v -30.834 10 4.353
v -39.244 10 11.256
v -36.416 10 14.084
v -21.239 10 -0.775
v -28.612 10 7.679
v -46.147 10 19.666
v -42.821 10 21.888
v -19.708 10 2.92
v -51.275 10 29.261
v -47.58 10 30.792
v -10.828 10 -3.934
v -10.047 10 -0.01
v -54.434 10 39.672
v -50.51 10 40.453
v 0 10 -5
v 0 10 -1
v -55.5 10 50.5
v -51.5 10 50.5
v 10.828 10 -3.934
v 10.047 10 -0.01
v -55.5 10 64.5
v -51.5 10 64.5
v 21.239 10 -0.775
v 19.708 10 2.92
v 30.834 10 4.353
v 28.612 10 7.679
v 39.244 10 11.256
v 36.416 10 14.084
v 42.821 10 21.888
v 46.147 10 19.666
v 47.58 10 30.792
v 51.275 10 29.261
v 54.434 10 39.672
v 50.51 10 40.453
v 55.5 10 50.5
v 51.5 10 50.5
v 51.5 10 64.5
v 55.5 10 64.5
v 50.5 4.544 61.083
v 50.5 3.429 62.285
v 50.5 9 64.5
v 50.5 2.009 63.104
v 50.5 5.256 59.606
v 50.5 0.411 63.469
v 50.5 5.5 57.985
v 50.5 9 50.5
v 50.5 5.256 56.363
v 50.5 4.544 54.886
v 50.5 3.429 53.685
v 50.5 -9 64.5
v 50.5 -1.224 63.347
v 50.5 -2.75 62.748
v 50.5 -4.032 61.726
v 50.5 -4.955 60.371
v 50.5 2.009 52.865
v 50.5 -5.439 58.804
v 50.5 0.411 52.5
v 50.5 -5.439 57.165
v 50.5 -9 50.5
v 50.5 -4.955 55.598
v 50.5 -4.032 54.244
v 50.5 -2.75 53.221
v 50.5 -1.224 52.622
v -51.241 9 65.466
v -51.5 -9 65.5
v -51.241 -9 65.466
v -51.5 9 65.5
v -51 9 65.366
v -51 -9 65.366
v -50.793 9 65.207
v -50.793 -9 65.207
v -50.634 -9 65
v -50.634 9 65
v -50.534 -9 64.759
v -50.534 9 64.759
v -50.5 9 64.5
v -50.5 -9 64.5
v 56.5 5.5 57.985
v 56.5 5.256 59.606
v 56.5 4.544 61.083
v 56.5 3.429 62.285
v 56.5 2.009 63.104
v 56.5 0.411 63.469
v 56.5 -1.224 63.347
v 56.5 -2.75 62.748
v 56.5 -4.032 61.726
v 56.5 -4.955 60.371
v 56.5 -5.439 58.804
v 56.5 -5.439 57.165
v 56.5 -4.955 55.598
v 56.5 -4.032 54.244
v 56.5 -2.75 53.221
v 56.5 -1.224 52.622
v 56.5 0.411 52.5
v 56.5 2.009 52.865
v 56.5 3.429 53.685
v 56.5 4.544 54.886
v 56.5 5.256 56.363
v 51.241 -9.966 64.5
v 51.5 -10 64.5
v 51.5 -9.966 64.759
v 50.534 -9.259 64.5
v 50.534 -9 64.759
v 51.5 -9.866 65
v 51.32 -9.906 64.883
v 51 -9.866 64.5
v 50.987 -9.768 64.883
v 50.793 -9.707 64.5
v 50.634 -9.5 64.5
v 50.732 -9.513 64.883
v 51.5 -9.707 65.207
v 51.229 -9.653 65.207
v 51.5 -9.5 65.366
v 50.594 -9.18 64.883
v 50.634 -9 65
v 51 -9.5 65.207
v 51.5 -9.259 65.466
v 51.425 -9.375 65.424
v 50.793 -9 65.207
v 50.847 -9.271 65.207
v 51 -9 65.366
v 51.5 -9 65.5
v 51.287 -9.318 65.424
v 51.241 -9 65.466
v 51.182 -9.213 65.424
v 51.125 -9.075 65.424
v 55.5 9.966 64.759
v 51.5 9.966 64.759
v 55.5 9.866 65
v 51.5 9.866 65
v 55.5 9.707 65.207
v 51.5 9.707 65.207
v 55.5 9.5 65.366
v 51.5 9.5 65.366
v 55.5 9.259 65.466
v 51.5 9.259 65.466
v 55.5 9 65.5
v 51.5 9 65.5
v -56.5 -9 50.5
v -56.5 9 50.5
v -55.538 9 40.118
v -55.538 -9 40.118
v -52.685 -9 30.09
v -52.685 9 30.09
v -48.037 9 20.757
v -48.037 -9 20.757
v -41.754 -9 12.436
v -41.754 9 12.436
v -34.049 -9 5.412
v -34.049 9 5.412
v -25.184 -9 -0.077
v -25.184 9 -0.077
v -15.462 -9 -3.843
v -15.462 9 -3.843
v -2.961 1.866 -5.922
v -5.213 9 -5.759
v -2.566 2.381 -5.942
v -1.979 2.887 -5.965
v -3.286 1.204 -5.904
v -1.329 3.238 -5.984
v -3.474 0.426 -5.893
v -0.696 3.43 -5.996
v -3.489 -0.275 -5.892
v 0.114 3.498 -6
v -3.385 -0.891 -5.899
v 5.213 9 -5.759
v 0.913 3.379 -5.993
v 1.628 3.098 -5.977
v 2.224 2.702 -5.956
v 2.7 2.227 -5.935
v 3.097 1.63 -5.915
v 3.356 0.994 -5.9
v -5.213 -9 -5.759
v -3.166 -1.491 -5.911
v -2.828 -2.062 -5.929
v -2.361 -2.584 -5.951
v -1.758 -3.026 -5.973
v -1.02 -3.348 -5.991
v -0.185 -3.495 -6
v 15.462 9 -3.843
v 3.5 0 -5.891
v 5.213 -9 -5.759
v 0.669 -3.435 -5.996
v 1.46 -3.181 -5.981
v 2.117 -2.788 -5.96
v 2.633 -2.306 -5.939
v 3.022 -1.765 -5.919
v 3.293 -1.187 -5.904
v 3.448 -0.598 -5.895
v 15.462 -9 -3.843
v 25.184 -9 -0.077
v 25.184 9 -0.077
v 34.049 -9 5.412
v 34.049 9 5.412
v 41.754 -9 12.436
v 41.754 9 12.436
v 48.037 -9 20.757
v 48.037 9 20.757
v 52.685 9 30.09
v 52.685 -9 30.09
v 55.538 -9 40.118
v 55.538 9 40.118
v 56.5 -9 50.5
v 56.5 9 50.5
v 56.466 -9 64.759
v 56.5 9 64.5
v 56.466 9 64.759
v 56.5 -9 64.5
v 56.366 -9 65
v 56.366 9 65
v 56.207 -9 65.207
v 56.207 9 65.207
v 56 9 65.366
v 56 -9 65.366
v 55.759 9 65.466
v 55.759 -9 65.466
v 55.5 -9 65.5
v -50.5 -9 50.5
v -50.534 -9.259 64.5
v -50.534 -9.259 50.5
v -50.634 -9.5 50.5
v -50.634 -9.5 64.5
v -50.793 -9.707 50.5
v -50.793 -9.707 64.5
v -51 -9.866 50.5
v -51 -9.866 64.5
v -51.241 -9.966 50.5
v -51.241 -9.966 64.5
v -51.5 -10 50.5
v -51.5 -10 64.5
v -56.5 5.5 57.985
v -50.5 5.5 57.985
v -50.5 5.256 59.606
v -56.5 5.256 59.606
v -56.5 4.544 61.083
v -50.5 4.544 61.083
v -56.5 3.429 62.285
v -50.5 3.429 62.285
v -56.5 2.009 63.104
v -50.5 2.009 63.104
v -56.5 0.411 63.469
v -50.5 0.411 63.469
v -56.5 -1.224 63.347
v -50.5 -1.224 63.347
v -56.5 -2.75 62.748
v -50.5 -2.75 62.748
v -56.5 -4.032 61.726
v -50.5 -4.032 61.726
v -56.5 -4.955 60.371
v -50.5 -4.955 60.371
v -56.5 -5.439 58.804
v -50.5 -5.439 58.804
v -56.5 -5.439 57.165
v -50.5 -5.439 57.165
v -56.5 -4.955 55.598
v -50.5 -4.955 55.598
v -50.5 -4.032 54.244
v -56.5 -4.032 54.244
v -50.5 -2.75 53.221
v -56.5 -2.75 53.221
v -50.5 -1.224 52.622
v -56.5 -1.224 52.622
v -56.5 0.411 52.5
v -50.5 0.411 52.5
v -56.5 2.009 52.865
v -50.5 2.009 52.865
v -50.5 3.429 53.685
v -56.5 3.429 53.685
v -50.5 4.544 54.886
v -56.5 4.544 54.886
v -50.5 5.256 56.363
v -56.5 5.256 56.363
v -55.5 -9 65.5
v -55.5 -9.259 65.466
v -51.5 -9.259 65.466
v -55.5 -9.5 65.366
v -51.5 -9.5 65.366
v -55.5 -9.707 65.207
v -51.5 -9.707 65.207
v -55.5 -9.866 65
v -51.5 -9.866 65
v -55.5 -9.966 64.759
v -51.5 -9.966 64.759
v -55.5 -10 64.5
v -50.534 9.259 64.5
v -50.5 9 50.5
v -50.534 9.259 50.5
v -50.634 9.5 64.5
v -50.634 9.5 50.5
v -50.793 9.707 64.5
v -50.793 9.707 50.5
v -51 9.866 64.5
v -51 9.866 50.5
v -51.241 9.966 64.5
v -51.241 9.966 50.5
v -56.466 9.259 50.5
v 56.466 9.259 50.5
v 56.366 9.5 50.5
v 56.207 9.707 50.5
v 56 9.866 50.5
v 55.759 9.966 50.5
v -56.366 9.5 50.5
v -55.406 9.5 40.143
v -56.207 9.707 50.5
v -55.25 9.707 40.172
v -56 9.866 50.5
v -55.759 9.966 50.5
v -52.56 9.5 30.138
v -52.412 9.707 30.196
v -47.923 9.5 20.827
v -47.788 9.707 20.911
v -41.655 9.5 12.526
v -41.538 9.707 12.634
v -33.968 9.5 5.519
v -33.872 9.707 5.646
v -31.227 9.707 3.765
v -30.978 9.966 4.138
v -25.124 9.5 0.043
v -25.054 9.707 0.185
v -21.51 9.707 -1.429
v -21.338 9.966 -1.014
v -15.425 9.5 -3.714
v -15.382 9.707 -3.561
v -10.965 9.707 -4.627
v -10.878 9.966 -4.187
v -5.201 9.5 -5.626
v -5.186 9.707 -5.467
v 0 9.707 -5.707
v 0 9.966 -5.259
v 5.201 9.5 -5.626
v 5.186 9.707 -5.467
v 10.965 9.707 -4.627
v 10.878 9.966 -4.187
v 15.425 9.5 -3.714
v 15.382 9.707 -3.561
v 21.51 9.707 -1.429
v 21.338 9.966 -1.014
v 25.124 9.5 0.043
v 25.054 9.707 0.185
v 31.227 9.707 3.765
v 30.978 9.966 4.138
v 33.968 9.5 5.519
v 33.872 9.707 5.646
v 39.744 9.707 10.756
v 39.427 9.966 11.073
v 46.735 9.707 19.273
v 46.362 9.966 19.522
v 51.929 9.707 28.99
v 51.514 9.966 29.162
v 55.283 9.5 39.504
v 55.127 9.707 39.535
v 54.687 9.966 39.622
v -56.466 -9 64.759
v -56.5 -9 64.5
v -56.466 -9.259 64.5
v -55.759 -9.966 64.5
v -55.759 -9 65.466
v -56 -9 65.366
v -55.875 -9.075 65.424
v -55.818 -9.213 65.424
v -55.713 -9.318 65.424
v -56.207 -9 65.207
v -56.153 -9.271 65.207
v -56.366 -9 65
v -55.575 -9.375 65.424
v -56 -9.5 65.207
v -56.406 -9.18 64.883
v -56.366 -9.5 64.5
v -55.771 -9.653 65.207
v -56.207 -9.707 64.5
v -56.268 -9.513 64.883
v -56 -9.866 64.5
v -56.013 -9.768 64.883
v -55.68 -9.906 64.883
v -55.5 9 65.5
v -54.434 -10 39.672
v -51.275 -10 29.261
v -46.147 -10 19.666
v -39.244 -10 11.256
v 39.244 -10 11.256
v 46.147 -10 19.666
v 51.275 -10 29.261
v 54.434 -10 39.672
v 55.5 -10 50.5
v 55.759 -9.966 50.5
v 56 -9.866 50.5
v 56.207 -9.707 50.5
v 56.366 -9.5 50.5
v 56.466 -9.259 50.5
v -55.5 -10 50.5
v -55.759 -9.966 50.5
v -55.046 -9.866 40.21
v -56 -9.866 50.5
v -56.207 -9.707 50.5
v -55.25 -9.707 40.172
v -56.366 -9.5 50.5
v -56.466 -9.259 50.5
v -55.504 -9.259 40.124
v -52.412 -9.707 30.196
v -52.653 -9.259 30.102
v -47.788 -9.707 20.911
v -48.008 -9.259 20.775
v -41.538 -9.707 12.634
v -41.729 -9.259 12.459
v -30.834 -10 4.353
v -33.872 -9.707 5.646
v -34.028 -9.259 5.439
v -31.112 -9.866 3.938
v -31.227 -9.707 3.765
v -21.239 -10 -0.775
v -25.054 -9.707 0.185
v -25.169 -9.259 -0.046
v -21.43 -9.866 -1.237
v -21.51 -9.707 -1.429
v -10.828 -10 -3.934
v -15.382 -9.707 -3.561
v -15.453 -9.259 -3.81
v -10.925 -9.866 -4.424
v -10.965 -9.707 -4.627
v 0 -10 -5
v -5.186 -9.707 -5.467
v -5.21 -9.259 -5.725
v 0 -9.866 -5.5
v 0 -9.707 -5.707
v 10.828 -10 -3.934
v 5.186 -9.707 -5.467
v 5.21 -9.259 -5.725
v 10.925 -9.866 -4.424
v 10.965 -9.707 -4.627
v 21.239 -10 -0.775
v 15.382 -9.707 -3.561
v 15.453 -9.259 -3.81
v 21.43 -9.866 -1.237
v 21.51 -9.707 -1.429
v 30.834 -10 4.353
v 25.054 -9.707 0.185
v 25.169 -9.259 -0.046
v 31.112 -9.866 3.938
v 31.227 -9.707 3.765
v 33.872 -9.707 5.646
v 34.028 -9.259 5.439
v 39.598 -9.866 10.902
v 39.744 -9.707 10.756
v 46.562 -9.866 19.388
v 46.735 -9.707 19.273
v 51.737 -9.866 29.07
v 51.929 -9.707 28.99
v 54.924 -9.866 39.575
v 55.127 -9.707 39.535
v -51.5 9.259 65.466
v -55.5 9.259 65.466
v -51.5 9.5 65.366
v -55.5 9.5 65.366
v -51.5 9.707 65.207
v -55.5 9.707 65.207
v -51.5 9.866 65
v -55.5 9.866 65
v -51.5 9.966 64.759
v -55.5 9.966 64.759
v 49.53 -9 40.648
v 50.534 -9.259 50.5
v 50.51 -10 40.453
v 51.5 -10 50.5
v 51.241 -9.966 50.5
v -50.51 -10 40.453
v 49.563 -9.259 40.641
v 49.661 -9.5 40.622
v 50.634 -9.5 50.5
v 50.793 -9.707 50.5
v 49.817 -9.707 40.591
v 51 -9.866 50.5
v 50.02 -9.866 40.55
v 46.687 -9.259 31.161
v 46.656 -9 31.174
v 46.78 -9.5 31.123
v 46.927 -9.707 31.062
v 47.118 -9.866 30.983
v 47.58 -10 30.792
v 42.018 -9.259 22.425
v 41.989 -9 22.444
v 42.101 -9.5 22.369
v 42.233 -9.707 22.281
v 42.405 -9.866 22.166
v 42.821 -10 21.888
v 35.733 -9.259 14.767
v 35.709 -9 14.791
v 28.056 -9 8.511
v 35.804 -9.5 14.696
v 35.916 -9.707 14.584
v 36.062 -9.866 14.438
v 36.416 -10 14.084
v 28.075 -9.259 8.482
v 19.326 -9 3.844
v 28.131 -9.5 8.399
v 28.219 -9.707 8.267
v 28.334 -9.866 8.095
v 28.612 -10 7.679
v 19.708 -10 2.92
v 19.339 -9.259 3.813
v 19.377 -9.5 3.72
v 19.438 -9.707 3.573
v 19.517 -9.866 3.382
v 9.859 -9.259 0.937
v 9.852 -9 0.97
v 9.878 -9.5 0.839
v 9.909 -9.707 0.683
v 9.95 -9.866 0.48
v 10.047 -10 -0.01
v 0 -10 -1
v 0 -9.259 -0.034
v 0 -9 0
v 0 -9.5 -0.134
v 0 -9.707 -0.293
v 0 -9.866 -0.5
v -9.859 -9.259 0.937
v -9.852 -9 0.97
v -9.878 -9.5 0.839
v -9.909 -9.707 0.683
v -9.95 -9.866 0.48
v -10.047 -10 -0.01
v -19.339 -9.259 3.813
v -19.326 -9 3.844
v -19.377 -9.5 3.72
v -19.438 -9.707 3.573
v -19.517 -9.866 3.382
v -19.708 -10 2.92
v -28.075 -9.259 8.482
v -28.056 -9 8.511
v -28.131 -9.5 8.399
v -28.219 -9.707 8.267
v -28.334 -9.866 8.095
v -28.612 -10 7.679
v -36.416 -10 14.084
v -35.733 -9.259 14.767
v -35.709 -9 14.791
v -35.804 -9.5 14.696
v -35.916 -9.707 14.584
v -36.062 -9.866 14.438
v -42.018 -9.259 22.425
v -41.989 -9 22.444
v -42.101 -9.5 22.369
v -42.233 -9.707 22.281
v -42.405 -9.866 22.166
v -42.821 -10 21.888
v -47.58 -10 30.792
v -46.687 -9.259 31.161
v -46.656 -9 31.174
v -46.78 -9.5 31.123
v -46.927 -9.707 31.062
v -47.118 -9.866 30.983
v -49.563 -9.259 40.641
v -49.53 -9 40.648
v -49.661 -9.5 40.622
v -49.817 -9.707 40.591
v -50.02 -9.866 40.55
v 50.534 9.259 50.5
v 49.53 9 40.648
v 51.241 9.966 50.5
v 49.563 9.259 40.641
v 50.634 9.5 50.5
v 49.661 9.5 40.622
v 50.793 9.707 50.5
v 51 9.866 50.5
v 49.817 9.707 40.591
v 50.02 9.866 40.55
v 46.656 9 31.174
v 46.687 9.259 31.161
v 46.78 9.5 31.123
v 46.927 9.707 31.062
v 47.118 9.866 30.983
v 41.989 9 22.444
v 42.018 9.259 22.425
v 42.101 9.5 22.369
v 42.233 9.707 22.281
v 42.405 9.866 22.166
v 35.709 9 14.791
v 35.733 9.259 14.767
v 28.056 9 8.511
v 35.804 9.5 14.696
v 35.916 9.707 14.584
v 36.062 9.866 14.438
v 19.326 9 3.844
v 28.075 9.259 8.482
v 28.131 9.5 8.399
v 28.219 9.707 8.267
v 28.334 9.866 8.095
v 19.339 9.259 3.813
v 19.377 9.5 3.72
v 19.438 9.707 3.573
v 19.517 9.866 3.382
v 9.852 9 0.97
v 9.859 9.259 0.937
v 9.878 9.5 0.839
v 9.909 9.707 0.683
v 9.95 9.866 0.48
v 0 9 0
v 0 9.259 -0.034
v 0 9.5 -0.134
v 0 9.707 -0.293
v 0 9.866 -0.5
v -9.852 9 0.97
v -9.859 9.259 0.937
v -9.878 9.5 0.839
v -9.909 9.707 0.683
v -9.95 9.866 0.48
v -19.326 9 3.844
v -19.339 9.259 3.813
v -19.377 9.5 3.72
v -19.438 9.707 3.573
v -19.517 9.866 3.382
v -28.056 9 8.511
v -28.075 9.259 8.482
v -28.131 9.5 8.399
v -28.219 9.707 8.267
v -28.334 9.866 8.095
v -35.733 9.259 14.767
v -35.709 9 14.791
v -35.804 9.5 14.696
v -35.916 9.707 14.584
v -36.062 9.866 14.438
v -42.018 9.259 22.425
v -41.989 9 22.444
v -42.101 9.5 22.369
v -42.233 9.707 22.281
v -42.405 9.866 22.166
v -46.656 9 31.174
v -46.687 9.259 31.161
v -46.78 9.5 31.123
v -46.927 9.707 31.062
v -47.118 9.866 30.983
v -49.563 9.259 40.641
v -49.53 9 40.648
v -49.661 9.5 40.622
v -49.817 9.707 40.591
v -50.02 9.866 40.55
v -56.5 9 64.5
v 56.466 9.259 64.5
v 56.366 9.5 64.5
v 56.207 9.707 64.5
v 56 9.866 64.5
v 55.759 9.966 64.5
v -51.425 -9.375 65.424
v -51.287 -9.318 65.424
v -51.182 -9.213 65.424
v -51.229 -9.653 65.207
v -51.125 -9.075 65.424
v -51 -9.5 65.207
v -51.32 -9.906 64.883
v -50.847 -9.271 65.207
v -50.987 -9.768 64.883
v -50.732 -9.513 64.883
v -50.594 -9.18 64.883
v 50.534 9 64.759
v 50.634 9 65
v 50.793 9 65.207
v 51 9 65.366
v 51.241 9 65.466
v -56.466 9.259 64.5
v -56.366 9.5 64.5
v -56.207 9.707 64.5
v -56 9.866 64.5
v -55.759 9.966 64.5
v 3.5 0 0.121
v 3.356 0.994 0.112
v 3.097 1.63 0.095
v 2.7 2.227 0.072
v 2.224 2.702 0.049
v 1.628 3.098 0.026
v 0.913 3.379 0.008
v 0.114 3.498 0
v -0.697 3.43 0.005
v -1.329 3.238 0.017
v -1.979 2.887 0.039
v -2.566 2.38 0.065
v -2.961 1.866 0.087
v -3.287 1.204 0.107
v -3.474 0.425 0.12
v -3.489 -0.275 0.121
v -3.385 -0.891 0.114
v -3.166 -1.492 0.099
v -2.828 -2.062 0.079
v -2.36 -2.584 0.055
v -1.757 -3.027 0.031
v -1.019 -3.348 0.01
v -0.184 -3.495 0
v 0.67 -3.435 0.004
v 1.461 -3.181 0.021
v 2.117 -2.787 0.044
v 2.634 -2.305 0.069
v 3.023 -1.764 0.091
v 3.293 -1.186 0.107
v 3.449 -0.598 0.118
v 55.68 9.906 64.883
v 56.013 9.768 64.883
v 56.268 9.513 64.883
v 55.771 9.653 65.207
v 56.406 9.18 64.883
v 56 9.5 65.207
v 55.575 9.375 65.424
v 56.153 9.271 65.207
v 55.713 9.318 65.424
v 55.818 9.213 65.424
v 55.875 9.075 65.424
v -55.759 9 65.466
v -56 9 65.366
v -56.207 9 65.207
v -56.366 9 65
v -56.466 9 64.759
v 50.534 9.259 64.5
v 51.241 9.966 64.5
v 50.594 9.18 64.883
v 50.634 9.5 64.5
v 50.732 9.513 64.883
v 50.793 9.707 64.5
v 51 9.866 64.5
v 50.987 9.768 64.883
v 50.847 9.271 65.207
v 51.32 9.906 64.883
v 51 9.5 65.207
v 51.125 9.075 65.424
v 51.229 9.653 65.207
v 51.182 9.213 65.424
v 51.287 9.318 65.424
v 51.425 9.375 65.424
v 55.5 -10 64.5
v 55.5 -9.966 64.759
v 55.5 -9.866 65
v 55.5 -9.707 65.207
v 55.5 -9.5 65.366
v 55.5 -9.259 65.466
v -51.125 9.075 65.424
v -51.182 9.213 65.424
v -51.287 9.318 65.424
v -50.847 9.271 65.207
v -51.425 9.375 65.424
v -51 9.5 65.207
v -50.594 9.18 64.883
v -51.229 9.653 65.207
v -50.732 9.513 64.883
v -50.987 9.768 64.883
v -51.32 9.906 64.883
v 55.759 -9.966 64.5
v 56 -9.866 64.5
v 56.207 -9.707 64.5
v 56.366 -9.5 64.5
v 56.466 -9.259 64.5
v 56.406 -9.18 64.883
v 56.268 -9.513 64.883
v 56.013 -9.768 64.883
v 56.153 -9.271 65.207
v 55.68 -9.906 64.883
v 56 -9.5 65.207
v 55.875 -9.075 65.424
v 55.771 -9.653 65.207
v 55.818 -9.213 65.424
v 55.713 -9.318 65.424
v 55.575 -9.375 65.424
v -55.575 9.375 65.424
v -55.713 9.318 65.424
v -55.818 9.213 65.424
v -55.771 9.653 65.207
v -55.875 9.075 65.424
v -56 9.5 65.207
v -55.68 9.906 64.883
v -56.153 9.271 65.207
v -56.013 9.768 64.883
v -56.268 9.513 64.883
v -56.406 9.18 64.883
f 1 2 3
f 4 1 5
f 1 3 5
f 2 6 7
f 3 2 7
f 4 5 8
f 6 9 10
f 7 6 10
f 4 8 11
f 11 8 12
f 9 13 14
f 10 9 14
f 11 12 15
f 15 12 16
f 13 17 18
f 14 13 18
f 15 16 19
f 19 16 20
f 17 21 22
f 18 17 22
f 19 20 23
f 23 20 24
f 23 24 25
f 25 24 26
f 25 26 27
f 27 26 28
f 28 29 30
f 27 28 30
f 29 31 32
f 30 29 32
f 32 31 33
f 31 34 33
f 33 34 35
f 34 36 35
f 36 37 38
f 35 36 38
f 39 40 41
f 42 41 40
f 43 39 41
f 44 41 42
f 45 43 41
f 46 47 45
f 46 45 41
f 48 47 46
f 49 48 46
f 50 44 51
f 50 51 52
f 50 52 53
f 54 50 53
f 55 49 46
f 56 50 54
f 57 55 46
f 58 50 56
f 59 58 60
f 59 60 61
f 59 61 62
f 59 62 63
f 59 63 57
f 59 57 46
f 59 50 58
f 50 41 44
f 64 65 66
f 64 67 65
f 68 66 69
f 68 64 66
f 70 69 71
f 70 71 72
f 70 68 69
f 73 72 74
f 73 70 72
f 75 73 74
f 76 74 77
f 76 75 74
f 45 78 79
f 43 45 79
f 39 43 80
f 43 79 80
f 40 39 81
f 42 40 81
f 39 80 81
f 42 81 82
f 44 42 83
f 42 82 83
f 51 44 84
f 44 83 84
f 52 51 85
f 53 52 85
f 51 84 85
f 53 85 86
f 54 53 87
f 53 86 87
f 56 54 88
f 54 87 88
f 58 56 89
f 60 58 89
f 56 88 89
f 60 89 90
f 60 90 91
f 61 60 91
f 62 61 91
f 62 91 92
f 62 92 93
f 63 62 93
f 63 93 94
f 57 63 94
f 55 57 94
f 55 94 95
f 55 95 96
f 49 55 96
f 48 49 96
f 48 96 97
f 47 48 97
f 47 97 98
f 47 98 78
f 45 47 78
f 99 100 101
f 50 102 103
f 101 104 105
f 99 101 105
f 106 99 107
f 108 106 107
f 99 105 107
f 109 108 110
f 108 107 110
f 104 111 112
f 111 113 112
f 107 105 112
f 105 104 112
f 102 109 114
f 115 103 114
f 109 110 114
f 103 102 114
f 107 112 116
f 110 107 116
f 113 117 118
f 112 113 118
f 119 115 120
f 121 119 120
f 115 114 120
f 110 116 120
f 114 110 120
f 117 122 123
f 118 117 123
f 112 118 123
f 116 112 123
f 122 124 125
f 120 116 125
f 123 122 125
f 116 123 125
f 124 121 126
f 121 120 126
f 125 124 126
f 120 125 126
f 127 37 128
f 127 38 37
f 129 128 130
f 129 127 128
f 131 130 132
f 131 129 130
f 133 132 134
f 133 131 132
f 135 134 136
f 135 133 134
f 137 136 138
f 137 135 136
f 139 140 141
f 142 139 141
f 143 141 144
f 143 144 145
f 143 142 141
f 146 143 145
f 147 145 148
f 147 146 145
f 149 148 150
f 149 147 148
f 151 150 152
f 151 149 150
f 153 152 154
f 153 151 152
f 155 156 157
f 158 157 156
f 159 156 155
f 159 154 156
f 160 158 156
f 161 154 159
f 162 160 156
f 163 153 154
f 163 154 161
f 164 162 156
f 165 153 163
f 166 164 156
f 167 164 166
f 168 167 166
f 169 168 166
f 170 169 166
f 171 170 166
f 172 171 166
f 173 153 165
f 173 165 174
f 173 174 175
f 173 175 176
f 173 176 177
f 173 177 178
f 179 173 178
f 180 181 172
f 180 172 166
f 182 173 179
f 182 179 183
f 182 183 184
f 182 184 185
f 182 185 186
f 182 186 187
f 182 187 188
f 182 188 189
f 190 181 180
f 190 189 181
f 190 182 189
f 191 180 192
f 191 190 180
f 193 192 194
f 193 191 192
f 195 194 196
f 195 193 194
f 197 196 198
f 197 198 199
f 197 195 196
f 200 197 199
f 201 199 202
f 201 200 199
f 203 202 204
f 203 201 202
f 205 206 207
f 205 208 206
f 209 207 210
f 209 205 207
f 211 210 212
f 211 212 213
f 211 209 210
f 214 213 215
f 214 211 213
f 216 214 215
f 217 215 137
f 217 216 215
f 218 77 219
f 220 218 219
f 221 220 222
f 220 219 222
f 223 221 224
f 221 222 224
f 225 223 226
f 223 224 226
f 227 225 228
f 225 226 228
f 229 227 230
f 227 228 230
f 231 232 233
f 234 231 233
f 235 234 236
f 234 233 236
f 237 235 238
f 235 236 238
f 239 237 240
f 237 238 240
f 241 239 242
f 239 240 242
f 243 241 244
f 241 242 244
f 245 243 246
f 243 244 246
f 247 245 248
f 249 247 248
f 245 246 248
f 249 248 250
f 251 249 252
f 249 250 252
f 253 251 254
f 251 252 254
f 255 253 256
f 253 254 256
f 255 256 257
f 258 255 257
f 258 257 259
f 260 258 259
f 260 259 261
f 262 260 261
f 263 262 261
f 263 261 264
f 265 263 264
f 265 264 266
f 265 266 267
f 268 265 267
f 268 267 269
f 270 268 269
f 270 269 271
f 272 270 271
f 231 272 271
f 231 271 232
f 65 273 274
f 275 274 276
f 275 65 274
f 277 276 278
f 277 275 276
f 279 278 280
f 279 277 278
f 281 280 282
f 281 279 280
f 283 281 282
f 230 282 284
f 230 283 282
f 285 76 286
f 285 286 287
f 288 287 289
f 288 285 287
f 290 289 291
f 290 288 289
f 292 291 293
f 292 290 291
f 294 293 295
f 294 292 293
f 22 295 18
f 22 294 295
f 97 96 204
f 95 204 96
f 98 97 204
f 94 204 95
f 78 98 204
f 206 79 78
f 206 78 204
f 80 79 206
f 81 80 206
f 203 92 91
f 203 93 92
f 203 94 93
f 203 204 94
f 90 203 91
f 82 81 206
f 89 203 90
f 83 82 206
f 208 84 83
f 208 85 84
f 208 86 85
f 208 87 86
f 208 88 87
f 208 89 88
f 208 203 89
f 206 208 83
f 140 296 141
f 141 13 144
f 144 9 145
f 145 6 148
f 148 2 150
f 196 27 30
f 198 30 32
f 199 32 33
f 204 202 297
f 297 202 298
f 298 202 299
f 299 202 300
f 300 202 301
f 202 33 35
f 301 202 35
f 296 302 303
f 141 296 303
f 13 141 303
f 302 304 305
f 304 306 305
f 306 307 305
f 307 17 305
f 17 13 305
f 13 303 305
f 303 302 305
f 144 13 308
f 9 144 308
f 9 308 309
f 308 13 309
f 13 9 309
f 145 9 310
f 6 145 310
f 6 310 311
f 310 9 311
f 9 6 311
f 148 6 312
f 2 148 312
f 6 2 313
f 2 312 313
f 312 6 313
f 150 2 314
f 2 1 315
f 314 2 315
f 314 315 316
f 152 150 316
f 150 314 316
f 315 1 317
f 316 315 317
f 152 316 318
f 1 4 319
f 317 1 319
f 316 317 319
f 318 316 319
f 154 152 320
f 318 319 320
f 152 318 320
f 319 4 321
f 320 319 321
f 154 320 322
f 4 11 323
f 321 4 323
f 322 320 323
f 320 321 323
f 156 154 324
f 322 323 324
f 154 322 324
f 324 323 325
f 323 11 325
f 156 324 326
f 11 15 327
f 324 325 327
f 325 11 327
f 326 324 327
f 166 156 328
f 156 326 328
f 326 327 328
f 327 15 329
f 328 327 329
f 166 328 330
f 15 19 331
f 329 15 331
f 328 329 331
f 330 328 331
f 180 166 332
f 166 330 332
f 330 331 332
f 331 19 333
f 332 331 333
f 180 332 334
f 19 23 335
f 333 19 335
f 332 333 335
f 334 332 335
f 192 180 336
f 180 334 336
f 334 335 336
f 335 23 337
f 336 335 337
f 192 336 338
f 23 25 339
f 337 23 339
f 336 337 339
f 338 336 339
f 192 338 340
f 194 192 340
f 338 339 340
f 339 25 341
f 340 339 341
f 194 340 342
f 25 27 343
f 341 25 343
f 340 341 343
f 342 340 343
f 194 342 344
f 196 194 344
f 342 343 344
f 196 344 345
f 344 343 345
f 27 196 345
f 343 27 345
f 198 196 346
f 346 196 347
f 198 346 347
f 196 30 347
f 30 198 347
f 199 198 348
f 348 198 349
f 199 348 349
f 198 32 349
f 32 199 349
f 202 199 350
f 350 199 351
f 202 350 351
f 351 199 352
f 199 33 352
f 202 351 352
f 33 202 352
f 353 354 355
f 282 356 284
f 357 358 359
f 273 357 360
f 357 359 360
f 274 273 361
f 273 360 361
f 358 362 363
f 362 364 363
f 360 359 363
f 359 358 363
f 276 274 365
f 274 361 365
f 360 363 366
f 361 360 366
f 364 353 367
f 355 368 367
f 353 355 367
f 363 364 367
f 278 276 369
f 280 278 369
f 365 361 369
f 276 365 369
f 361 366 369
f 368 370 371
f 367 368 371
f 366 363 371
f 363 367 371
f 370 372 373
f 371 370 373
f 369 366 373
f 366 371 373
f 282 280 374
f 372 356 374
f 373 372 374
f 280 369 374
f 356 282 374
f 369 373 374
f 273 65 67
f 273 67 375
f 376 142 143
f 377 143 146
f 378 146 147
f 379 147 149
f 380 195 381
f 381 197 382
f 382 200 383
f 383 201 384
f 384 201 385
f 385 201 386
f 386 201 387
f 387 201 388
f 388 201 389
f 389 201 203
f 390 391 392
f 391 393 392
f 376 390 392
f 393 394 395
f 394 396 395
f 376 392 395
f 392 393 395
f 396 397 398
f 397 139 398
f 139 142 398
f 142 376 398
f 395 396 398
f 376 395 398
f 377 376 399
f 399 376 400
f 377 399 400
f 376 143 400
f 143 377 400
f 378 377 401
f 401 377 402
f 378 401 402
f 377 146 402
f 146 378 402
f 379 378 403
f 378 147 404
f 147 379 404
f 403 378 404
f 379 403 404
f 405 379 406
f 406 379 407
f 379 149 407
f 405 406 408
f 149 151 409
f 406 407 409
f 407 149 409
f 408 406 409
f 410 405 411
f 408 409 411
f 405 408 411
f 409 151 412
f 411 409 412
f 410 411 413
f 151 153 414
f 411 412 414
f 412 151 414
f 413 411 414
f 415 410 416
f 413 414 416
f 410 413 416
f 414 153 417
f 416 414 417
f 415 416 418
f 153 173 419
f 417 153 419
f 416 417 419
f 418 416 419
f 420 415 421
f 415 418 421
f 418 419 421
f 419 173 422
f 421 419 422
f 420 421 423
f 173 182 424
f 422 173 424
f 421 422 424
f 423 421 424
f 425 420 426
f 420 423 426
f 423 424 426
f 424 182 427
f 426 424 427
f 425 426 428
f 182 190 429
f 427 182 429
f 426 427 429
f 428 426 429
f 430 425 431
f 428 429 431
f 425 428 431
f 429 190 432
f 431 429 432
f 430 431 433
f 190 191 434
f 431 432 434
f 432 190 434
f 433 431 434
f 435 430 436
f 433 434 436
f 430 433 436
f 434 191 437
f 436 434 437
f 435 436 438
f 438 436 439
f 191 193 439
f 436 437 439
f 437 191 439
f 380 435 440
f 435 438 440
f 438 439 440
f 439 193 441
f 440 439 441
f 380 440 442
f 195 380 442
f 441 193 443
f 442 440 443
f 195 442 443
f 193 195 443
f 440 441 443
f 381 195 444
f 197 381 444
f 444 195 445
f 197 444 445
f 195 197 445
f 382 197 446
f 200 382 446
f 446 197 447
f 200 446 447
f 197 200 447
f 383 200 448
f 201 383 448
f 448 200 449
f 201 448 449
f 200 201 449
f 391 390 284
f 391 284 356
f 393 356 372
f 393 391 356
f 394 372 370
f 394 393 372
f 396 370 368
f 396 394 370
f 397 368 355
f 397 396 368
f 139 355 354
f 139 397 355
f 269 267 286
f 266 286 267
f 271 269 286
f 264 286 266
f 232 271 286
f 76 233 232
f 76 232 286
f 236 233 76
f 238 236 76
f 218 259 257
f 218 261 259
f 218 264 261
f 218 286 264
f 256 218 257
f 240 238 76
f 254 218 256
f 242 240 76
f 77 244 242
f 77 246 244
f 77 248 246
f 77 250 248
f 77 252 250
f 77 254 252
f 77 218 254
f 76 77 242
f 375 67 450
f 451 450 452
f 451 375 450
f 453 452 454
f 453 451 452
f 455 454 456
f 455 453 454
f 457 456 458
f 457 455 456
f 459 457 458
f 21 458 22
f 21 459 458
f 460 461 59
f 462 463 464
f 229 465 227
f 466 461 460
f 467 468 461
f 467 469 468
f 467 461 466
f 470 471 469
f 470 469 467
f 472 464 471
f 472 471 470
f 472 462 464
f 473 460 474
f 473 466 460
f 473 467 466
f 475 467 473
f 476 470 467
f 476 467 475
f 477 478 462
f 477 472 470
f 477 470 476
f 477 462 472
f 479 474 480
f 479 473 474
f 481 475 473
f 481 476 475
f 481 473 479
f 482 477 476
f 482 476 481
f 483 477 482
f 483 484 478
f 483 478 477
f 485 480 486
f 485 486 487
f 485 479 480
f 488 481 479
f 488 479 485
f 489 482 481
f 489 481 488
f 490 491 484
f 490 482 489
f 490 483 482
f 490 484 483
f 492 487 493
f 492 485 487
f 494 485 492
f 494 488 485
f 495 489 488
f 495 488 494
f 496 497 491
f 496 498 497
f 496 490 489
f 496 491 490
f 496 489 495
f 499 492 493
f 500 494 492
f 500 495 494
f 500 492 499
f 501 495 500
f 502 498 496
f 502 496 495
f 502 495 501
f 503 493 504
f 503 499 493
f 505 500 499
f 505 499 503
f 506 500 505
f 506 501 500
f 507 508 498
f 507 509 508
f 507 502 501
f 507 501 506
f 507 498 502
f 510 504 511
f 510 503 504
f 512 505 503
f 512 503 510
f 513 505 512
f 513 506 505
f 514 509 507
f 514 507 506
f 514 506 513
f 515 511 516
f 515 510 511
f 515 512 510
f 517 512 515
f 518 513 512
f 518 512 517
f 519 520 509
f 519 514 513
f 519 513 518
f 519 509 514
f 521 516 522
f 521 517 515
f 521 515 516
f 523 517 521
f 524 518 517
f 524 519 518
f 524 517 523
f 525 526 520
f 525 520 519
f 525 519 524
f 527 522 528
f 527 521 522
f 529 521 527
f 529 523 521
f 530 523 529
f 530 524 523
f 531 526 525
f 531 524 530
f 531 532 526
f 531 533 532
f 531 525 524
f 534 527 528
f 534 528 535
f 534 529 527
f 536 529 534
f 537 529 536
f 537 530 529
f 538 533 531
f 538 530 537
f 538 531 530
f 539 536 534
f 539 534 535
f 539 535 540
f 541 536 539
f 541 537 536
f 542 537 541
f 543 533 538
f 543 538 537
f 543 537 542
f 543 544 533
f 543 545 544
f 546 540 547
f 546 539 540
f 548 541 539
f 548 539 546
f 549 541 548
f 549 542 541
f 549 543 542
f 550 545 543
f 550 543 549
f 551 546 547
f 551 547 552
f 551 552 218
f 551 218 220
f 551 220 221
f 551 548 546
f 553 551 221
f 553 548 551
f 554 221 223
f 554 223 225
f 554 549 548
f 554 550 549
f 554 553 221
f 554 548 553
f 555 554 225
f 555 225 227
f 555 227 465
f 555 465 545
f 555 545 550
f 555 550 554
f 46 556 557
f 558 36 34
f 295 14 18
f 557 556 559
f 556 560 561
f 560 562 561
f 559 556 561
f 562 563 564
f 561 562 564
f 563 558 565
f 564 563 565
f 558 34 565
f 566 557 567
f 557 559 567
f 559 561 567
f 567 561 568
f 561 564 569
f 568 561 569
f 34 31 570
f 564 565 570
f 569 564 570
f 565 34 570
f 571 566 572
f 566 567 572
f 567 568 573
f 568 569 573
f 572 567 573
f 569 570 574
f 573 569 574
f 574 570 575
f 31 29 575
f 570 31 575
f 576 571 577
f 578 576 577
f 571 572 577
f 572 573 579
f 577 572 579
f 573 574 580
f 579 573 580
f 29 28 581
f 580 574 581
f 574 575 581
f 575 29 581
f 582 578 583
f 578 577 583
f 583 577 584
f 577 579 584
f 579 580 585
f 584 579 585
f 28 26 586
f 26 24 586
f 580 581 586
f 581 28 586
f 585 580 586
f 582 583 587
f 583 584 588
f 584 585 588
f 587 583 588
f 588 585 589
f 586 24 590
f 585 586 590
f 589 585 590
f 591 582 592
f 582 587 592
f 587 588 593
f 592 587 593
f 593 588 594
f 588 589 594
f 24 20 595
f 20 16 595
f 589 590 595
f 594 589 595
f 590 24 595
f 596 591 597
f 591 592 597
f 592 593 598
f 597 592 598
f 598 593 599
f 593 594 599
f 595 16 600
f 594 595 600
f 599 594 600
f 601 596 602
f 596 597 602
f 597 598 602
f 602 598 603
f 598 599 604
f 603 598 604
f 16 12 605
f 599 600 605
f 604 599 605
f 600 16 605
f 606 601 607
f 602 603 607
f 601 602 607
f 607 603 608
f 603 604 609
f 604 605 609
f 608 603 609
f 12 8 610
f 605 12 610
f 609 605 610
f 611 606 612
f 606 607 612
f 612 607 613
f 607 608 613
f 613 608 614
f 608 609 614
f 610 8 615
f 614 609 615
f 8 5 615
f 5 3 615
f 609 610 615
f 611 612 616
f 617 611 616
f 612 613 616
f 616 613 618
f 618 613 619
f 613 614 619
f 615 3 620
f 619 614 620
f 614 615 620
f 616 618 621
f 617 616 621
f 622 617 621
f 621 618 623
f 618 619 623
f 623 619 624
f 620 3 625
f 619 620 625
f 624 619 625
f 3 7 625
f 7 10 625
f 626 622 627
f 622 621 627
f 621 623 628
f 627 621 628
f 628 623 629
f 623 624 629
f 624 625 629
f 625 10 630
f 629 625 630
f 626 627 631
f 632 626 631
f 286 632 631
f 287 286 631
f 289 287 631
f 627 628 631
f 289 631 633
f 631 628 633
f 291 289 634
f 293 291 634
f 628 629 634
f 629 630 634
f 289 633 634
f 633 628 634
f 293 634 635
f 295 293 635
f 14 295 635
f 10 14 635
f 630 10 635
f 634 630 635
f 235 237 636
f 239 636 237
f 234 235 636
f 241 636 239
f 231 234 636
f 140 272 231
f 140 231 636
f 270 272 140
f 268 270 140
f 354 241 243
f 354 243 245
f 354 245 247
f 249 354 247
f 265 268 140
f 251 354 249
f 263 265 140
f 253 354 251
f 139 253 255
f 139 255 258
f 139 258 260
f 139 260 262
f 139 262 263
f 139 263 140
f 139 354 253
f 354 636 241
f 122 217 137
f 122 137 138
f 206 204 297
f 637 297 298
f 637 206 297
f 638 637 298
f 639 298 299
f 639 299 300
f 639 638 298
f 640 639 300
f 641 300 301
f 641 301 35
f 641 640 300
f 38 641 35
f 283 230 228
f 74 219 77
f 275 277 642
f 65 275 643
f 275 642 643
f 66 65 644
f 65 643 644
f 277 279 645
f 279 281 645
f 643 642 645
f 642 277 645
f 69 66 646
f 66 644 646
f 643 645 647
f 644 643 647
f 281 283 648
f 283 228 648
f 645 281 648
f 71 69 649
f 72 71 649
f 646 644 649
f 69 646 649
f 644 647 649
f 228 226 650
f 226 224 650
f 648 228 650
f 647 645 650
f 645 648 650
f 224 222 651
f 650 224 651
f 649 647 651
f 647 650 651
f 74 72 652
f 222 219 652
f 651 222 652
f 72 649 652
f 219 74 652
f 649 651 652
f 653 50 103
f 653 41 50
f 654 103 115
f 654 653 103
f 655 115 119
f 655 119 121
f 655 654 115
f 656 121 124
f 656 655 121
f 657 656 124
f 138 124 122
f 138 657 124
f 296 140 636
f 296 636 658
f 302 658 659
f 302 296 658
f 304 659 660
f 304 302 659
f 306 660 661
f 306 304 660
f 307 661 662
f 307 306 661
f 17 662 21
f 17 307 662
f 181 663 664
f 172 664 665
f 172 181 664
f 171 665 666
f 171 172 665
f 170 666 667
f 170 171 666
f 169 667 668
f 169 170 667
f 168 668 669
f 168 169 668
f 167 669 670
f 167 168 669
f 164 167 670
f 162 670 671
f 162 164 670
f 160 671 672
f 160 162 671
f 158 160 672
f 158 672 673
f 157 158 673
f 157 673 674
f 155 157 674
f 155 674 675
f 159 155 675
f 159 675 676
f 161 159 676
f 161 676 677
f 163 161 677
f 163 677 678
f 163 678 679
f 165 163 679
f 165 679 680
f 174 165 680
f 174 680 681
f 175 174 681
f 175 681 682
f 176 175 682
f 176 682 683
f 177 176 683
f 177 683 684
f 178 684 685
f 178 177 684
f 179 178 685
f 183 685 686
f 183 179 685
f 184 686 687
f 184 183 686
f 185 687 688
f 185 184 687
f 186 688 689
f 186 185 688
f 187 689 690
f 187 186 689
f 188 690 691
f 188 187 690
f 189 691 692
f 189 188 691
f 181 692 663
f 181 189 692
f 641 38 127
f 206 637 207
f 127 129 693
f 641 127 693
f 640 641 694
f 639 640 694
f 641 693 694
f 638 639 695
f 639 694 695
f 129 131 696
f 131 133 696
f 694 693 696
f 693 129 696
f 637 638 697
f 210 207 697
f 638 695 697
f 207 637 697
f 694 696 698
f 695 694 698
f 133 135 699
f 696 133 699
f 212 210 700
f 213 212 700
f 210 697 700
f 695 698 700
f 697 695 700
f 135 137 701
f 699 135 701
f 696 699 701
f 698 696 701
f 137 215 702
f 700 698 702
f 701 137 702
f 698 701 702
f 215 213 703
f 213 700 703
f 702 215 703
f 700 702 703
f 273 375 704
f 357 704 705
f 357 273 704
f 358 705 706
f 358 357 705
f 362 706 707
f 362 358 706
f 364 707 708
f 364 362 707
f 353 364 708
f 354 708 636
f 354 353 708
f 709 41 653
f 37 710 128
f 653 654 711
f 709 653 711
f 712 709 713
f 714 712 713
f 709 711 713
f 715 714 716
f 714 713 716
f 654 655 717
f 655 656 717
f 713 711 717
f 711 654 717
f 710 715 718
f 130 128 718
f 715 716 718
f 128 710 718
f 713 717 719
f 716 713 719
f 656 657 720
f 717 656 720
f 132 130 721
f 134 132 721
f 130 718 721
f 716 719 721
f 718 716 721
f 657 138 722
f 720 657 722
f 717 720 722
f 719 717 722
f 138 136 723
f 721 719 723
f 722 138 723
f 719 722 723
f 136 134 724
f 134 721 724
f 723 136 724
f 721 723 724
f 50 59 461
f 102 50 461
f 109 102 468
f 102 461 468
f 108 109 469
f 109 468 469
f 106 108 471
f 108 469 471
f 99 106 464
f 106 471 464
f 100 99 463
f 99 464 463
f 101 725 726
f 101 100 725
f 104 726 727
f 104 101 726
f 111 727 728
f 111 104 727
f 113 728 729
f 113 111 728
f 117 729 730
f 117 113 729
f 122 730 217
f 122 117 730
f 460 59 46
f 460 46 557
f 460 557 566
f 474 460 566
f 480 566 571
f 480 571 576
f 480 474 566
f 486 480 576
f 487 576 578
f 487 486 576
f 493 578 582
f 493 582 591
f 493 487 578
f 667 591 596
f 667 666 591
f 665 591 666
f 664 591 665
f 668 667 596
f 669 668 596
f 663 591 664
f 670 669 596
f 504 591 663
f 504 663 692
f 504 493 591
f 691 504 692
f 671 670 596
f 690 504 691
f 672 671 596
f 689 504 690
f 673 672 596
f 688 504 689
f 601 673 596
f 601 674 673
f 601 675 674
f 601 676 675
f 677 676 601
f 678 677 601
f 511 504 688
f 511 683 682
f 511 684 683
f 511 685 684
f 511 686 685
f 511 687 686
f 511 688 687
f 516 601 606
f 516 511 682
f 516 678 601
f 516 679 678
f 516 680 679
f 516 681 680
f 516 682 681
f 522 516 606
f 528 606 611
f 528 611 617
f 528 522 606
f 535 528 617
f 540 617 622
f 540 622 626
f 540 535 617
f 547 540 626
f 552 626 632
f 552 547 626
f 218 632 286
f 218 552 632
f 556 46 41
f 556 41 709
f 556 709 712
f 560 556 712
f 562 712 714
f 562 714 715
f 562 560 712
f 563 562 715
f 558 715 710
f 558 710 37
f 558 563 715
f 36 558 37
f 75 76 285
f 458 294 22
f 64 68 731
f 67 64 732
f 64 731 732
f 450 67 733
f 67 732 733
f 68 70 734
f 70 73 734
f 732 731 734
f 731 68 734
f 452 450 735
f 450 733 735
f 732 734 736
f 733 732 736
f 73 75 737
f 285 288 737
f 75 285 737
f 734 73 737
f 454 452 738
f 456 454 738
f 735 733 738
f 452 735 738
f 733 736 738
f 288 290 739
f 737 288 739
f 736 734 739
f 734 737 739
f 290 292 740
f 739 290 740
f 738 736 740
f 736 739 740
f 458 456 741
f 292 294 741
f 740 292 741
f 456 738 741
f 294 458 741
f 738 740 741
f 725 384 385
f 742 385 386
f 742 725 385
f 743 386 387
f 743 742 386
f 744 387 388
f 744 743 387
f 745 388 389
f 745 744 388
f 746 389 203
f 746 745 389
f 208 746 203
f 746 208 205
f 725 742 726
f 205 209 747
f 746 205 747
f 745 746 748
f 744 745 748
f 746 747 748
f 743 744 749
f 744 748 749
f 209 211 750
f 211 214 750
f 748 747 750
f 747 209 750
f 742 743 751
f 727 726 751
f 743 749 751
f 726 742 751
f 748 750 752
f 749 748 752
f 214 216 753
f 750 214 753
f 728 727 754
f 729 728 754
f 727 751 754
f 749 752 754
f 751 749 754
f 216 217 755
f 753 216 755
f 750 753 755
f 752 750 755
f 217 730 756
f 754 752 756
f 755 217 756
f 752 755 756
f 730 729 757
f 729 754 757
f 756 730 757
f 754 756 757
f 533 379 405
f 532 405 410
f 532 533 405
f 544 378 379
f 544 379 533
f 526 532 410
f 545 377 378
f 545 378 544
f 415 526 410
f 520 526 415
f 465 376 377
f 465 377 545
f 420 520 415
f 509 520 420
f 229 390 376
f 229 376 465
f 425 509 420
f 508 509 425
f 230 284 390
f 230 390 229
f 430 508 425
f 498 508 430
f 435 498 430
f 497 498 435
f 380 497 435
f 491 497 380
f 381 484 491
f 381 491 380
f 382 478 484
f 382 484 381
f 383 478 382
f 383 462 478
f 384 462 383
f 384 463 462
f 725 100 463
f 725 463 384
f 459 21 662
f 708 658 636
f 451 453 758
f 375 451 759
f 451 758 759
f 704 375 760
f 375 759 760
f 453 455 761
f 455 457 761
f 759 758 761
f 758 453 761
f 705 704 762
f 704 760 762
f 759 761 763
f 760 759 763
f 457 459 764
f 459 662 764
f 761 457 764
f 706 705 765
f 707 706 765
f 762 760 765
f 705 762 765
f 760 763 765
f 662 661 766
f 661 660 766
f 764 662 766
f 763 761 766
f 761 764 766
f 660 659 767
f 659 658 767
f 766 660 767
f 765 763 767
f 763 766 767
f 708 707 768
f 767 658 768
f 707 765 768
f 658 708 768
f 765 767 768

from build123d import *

# Parameters (mm, degrees)
F1_DEPTH = 10
F2_R     = 1
F4_R     = 5.5
F5_DEPTH = 113.001
F7_R     = 3.5
F8_DEPTH = 90.501
F9_R     = 1
F10_R    = 1


with BuildPart() as f1:
    # F0 (on Front) → F1 (new body, symmetric)
    with BuildSketch(Plane.XZ):
        with BuildLine():
            Line((-56.5, 65.5), (-56.5, 50.5))
            ThreePointArc((-56.5, 50.5), (0, -6), (56.5, 50.5))
            Line((56.5, 50.5), (56.5, 65.5))
            Line((56.5, 65.5), (50.5000007153, 65.5))
            Line((50.5000007153, 65.5), (50.5000007153, 50.5))
            ThreePointArc((50.5000007153, 50.5), (7.153e-07, 0), (-50.4999992847, 50.5))
            Line((-50.4999992847, 50.5), (-50.4999992847, 65.5))
            Line((-50.4999992847, 65.5), (-56.5, 65.5))
        make_face()
    extrude(amount=F1_DEPTH, both=True)

    # F2
    f2_edges = [f1.edges().sort_by_distance(p)[0] for p in [
        (1e-06, -10, 0),
        (-50.499999, -10, 58),
        (50.500001, -10, 58),
        (0, -10, -6),
        (-56.5, -10, 58),
        (-50.499999, 10, 58),
        (1e-06, 10, 0),
        (50.500001, 10, 58),
        (56.5, 10, 58),
        (0, 10, -6),
        (-56.5, 10, 58),
    ]]
    fillet(f2_edges, radius=F2_R)

    # F4 (on offset) → F5 (cut, through all)
    with BuildSketch(Plane.YZ.offset(56.5)):
        with Locations((0, 57.9845793545)):
            Circle(F4_R)
    extrude(amount=-F5_DEPTH, mode=Mode.SUBTRACT)

    # F7 (on offset) → F8 (cut, through all)
    with BuildSketch(Plane.XY.offset(-25)):
        Circle(F7_R)
    extrude(amount=F8_DEPTH, mode=Mode.SUBTRACT)

    # F9
    f9_edges = [f1.edges().sort_by_distance(p)[0] for p in [
        (-50.499999, 0, 65.5),
        (-50.792893, -9.707107, 65.5),
        (-53.5, -10, 65.5),
        (-56.5, 0, 65.5),
        (-56.207107, -9.707107, 65.5),
        (-56.207107, 9.707107, 65.5),
        (-53.5, 10, 65.5),
        (-50.792893, 9.707107, 65.5),
    ]]
    fillet(f9_edges, radius=F9_R)

    # F10
    f10_edges = [f1.edges().sort_by_distance(p)[0] for p in [
        (56.5, 0, 65.5),
        (56.207107, -9.707107, 65.5),
        (53.5, -10, 65.5),
        (50.792894, -9.707107, 65.5),
        (50.500001, 0, 65.5),
        (50.792894, 9.707107, 65.5),
        (53.5, 10, 65.5),
        (56.207107, 9.707107, 65.5),
    ]]
    fillet(f10_edges, radius=F10_R)


solid = f1.part
